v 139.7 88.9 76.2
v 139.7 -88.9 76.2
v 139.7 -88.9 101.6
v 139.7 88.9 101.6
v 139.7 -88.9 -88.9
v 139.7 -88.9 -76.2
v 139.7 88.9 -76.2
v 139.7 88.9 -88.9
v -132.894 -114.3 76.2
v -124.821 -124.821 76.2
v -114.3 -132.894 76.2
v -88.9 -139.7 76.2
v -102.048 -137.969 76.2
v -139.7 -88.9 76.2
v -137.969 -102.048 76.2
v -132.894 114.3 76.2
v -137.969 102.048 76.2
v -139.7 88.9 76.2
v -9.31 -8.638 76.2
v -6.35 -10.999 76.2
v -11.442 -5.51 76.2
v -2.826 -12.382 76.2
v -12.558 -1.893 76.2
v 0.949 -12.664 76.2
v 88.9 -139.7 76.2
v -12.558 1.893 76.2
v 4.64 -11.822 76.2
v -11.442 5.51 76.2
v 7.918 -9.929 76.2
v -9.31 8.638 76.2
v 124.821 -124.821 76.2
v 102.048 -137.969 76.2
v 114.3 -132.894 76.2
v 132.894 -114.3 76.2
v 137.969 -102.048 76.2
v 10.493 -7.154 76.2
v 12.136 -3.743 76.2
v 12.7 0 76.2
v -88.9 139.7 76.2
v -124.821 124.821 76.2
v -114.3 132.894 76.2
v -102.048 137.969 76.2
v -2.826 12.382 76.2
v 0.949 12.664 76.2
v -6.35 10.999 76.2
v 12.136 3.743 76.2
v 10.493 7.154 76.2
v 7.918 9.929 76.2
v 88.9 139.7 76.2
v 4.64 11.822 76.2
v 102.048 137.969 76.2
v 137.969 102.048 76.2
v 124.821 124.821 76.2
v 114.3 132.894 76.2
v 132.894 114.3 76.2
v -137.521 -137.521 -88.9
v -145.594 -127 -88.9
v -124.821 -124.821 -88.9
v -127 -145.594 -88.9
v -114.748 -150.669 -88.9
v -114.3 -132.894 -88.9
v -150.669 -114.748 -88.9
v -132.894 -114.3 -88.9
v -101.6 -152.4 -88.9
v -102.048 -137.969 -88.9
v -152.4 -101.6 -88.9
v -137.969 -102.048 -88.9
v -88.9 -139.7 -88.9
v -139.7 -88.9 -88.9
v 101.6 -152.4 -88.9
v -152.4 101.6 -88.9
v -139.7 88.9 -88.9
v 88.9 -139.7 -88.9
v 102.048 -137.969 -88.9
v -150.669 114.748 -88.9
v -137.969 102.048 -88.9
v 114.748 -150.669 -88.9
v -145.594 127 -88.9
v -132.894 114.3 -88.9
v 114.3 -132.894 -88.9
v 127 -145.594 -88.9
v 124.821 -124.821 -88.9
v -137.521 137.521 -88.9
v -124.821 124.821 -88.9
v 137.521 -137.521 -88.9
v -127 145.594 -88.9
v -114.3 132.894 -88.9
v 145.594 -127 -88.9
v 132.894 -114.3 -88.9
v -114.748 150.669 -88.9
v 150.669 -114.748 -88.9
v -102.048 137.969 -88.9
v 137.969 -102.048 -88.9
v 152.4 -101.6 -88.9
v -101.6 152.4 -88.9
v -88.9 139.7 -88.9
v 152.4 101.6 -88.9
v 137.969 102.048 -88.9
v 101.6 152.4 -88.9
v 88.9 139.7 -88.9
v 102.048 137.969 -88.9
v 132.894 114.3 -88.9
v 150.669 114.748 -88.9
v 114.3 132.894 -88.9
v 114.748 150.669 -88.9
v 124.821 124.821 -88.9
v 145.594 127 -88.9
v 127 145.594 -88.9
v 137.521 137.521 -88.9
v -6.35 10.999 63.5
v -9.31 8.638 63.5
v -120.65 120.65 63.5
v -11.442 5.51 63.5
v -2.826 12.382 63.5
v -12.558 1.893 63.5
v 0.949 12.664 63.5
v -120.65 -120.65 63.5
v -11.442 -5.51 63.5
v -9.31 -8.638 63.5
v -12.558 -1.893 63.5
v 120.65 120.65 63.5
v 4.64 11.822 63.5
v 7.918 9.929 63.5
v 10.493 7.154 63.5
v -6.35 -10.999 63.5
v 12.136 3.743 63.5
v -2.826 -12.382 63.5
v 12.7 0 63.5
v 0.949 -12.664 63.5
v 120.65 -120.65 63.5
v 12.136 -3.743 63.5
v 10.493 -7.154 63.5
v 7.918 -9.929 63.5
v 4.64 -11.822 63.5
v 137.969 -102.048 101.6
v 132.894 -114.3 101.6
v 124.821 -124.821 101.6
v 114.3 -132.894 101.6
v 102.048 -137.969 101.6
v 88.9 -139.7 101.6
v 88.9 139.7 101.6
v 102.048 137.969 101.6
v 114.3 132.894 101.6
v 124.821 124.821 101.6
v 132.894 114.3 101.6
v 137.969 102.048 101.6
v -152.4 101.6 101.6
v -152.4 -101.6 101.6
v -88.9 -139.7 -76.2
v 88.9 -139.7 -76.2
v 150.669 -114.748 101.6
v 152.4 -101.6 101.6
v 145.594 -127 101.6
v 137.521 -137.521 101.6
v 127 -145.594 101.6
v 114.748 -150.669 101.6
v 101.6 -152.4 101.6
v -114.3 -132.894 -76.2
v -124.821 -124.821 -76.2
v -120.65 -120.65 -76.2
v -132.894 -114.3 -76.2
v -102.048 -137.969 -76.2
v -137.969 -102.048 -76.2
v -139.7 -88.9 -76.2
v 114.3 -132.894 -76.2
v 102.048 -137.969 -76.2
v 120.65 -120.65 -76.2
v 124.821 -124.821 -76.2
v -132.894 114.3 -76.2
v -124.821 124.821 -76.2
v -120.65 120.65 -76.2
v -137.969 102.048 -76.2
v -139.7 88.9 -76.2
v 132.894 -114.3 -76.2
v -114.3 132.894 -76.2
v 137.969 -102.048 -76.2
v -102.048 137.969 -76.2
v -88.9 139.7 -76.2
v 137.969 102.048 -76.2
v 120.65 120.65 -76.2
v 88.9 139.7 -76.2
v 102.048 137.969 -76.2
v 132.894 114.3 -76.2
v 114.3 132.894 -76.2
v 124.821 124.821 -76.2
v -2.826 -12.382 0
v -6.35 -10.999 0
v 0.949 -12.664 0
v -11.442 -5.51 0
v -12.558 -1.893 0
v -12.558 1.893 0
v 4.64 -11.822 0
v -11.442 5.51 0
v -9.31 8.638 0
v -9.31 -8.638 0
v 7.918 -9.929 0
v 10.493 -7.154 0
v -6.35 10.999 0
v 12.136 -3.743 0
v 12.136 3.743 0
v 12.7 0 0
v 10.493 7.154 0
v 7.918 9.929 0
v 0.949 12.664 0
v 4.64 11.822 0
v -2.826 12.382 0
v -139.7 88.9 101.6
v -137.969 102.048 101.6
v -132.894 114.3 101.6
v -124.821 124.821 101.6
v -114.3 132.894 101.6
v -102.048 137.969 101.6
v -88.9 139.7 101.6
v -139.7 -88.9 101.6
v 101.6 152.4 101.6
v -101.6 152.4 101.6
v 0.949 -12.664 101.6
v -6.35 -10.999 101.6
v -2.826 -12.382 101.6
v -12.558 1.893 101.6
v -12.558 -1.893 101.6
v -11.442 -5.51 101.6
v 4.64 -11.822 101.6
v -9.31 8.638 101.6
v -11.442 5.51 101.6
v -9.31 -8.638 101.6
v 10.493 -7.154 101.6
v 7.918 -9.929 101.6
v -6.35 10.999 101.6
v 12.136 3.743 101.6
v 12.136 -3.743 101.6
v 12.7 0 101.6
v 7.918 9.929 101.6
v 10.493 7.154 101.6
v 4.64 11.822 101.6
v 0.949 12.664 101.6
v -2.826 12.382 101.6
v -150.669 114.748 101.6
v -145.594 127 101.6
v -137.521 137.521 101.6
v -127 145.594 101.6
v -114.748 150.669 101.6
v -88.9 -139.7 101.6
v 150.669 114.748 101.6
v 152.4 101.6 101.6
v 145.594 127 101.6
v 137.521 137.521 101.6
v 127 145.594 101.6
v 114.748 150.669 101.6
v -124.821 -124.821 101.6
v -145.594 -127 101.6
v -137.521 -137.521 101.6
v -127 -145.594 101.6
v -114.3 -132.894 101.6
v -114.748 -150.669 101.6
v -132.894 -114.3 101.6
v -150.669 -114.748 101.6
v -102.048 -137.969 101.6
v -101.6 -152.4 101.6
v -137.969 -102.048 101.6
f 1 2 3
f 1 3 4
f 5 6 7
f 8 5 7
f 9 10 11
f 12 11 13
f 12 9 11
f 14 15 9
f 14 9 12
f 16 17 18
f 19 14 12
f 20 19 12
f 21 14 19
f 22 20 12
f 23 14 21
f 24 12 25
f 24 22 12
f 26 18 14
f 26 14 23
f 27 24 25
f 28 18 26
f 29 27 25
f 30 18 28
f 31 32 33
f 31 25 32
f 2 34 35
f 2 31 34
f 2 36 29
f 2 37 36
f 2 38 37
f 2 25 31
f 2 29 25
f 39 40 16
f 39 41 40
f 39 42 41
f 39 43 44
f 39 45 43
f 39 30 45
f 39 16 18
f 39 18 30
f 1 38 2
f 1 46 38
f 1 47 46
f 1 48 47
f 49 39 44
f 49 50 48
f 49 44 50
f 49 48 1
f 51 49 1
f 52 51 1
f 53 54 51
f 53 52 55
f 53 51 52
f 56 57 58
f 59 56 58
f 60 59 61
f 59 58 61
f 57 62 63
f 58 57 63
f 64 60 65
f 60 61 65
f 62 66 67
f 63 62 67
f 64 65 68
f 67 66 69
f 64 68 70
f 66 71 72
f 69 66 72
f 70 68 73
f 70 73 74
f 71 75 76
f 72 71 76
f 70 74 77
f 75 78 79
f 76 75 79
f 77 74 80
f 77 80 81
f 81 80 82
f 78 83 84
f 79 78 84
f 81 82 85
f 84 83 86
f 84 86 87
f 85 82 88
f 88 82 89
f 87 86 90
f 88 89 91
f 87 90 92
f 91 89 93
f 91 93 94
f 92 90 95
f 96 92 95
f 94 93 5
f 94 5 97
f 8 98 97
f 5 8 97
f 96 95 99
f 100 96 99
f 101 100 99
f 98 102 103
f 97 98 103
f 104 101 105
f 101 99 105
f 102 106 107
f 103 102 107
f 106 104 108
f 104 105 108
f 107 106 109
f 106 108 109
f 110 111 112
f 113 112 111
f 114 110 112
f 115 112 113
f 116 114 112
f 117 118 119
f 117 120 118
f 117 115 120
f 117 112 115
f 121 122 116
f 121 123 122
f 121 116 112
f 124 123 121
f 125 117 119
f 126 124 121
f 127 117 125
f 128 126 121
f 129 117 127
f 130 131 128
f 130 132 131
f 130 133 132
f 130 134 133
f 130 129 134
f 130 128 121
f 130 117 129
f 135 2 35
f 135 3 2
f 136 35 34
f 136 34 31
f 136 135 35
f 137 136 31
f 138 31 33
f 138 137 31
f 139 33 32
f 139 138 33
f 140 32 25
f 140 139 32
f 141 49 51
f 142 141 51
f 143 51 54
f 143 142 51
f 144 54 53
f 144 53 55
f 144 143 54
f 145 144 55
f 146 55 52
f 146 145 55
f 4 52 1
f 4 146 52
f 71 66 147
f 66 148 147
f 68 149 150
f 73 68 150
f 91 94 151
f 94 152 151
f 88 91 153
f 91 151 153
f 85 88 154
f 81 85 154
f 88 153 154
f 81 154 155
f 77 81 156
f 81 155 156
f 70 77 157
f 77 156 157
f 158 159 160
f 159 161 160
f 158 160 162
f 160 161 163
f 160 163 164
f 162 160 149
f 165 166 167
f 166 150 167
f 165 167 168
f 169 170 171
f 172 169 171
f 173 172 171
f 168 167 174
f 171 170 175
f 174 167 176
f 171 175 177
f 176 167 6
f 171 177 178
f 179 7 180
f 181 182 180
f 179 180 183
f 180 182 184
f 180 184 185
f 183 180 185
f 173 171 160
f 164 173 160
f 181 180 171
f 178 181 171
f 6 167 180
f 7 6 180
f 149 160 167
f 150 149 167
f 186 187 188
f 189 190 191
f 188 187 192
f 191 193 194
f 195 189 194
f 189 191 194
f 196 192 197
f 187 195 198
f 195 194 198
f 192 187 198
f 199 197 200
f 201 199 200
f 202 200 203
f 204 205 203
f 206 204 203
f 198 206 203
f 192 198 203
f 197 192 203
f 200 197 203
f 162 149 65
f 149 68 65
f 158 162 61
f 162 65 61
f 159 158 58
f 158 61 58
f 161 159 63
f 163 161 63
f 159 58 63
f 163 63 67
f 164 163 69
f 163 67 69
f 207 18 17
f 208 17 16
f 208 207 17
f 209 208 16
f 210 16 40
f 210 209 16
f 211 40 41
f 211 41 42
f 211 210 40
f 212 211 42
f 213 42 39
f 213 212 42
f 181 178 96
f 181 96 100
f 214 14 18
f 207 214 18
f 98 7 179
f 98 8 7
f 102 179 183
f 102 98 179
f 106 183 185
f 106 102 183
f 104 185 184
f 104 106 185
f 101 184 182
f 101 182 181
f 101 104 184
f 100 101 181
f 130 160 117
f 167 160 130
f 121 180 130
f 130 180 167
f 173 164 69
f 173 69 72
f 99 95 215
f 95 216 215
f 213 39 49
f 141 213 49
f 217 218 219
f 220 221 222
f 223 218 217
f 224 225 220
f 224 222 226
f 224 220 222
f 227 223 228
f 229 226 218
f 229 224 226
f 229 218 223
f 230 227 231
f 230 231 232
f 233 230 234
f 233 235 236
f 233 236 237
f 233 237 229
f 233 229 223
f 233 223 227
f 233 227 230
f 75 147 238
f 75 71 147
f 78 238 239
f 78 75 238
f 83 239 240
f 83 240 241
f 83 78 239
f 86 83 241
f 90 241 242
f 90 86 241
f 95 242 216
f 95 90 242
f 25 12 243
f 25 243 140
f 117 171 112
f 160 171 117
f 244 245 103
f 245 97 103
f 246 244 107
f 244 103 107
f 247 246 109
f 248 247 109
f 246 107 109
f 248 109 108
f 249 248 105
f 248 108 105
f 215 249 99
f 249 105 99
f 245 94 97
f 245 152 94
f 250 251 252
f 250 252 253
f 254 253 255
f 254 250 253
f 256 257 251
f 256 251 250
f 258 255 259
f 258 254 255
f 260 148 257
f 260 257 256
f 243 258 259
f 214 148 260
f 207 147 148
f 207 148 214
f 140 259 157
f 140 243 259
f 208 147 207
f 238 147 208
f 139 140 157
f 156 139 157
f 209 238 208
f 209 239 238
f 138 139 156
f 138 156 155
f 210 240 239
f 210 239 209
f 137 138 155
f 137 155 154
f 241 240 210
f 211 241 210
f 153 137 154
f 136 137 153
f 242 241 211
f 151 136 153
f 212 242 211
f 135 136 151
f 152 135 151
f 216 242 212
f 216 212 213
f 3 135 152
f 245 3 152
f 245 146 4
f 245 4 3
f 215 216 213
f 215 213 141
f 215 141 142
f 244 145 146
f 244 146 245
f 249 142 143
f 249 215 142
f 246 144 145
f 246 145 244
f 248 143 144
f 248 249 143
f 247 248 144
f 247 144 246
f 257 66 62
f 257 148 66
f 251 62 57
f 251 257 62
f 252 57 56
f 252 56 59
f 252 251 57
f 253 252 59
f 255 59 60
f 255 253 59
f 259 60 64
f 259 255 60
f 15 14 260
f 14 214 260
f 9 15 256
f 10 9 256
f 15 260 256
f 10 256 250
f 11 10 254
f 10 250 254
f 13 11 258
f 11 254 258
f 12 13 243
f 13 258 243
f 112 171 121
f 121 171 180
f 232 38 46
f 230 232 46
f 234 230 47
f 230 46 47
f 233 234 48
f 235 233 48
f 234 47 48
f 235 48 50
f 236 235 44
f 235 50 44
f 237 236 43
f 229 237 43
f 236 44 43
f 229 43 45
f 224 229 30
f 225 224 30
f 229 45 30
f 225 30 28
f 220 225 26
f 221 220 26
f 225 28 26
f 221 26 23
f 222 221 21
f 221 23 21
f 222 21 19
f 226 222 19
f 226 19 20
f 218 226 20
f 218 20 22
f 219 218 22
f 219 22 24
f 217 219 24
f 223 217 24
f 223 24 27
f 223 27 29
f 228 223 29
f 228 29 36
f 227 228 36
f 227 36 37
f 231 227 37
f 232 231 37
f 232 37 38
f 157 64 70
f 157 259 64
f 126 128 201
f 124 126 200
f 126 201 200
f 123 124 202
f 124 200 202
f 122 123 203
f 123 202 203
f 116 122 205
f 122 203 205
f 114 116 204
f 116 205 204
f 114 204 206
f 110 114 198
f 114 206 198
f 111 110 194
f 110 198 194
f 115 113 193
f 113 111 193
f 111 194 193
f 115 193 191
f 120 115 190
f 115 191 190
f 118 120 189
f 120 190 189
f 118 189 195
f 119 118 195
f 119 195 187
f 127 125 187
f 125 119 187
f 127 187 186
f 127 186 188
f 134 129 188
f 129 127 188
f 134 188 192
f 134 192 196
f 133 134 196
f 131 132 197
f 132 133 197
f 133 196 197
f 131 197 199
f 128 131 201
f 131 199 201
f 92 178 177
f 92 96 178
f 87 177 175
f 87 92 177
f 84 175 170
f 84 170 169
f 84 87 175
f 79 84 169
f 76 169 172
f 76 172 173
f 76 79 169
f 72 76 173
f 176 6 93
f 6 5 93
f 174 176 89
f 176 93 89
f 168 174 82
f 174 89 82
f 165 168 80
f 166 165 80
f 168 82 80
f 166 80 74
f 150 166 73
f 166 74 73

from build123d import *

# Parameters (mm, degrees)
F0_W          = 279.4
F0_H          = 279.4
F0_R          = 12.7
F1_DEPTH      = 76.2
F0_W_2        = 304.8
F0_H_2        = 304.8
F2_DEPTH      = 101.6
F2_DEPTH_BACK = 88.9
F3_R          = 50.8
F4_W          = 241.3
F4_H          = 241.3
F5_DEPTH      = 139.7
F6_DEPTH      = 101.6


with BuildPart() as f1:
    # F0 (on Top) → F1 (new body, symmetric)
    with BuildSketch(Plane.XY):
        Rectangle(F0_W, F0_H)
        Circle(F0_R, mode=Mode.SUBTRACT)
    extrude(amount=F1_DEPTH, both=True)

    # F0 (on Top) → F2 (join, two sides)
    with BuildSketch(Plane.XY) as f2_sk:
        Rectangle(F0_W_2, F0_H_2)
        Rectangle(F0_W, F0_H, mode=Mode.SUBTRACT)
    extrude(amount=F2_DEPTH)
    extrude(f2_sk.sketch, amount=-F2_DEPTH_BACK)

    # F3
    f3_edges = [f1.edges().sort_by_distance(p)[0] for p in [
        (152.4, -152.4, 6.35),
        (152.4, 152.4, 6.35),
        (-152.4, 152.4, 6.35),
        (-152.4, -152.4, 6.35),
        (-139.7, -139.7, 88.9),
        (-139.7, -139.7, -82.55),
        (-139.7, 139.7, 88.9),
        (-139.7, 139.7, -82.55),
        (139.7, 139.7, 88.9),
        (139.7, 139.7, -82.55),
        (139.7, -139.7, 88.9),
        (139.7, -139.7, -82.55),
    ]]
    fillet(f3_edges, radius=F3_R)

    # F4 (on face) → F5 (cut)
    with BuildSketch(Plane(origin=(0, 0, -76.2), x_dir=(1, 0, 0), z_dir=(0, 0, -1))):
        Rectangle(F4_W, F4_H)
    extrude(amount=-F5_DEPTH, mode=Mode.SUBTRACT)

    # F0 (on Top) → F6 (join)
    with BuildSketch(Plane.XY):
        Circle(F0_R)
    extrude(amount=F6_DEPTH)


solid = f1.part
